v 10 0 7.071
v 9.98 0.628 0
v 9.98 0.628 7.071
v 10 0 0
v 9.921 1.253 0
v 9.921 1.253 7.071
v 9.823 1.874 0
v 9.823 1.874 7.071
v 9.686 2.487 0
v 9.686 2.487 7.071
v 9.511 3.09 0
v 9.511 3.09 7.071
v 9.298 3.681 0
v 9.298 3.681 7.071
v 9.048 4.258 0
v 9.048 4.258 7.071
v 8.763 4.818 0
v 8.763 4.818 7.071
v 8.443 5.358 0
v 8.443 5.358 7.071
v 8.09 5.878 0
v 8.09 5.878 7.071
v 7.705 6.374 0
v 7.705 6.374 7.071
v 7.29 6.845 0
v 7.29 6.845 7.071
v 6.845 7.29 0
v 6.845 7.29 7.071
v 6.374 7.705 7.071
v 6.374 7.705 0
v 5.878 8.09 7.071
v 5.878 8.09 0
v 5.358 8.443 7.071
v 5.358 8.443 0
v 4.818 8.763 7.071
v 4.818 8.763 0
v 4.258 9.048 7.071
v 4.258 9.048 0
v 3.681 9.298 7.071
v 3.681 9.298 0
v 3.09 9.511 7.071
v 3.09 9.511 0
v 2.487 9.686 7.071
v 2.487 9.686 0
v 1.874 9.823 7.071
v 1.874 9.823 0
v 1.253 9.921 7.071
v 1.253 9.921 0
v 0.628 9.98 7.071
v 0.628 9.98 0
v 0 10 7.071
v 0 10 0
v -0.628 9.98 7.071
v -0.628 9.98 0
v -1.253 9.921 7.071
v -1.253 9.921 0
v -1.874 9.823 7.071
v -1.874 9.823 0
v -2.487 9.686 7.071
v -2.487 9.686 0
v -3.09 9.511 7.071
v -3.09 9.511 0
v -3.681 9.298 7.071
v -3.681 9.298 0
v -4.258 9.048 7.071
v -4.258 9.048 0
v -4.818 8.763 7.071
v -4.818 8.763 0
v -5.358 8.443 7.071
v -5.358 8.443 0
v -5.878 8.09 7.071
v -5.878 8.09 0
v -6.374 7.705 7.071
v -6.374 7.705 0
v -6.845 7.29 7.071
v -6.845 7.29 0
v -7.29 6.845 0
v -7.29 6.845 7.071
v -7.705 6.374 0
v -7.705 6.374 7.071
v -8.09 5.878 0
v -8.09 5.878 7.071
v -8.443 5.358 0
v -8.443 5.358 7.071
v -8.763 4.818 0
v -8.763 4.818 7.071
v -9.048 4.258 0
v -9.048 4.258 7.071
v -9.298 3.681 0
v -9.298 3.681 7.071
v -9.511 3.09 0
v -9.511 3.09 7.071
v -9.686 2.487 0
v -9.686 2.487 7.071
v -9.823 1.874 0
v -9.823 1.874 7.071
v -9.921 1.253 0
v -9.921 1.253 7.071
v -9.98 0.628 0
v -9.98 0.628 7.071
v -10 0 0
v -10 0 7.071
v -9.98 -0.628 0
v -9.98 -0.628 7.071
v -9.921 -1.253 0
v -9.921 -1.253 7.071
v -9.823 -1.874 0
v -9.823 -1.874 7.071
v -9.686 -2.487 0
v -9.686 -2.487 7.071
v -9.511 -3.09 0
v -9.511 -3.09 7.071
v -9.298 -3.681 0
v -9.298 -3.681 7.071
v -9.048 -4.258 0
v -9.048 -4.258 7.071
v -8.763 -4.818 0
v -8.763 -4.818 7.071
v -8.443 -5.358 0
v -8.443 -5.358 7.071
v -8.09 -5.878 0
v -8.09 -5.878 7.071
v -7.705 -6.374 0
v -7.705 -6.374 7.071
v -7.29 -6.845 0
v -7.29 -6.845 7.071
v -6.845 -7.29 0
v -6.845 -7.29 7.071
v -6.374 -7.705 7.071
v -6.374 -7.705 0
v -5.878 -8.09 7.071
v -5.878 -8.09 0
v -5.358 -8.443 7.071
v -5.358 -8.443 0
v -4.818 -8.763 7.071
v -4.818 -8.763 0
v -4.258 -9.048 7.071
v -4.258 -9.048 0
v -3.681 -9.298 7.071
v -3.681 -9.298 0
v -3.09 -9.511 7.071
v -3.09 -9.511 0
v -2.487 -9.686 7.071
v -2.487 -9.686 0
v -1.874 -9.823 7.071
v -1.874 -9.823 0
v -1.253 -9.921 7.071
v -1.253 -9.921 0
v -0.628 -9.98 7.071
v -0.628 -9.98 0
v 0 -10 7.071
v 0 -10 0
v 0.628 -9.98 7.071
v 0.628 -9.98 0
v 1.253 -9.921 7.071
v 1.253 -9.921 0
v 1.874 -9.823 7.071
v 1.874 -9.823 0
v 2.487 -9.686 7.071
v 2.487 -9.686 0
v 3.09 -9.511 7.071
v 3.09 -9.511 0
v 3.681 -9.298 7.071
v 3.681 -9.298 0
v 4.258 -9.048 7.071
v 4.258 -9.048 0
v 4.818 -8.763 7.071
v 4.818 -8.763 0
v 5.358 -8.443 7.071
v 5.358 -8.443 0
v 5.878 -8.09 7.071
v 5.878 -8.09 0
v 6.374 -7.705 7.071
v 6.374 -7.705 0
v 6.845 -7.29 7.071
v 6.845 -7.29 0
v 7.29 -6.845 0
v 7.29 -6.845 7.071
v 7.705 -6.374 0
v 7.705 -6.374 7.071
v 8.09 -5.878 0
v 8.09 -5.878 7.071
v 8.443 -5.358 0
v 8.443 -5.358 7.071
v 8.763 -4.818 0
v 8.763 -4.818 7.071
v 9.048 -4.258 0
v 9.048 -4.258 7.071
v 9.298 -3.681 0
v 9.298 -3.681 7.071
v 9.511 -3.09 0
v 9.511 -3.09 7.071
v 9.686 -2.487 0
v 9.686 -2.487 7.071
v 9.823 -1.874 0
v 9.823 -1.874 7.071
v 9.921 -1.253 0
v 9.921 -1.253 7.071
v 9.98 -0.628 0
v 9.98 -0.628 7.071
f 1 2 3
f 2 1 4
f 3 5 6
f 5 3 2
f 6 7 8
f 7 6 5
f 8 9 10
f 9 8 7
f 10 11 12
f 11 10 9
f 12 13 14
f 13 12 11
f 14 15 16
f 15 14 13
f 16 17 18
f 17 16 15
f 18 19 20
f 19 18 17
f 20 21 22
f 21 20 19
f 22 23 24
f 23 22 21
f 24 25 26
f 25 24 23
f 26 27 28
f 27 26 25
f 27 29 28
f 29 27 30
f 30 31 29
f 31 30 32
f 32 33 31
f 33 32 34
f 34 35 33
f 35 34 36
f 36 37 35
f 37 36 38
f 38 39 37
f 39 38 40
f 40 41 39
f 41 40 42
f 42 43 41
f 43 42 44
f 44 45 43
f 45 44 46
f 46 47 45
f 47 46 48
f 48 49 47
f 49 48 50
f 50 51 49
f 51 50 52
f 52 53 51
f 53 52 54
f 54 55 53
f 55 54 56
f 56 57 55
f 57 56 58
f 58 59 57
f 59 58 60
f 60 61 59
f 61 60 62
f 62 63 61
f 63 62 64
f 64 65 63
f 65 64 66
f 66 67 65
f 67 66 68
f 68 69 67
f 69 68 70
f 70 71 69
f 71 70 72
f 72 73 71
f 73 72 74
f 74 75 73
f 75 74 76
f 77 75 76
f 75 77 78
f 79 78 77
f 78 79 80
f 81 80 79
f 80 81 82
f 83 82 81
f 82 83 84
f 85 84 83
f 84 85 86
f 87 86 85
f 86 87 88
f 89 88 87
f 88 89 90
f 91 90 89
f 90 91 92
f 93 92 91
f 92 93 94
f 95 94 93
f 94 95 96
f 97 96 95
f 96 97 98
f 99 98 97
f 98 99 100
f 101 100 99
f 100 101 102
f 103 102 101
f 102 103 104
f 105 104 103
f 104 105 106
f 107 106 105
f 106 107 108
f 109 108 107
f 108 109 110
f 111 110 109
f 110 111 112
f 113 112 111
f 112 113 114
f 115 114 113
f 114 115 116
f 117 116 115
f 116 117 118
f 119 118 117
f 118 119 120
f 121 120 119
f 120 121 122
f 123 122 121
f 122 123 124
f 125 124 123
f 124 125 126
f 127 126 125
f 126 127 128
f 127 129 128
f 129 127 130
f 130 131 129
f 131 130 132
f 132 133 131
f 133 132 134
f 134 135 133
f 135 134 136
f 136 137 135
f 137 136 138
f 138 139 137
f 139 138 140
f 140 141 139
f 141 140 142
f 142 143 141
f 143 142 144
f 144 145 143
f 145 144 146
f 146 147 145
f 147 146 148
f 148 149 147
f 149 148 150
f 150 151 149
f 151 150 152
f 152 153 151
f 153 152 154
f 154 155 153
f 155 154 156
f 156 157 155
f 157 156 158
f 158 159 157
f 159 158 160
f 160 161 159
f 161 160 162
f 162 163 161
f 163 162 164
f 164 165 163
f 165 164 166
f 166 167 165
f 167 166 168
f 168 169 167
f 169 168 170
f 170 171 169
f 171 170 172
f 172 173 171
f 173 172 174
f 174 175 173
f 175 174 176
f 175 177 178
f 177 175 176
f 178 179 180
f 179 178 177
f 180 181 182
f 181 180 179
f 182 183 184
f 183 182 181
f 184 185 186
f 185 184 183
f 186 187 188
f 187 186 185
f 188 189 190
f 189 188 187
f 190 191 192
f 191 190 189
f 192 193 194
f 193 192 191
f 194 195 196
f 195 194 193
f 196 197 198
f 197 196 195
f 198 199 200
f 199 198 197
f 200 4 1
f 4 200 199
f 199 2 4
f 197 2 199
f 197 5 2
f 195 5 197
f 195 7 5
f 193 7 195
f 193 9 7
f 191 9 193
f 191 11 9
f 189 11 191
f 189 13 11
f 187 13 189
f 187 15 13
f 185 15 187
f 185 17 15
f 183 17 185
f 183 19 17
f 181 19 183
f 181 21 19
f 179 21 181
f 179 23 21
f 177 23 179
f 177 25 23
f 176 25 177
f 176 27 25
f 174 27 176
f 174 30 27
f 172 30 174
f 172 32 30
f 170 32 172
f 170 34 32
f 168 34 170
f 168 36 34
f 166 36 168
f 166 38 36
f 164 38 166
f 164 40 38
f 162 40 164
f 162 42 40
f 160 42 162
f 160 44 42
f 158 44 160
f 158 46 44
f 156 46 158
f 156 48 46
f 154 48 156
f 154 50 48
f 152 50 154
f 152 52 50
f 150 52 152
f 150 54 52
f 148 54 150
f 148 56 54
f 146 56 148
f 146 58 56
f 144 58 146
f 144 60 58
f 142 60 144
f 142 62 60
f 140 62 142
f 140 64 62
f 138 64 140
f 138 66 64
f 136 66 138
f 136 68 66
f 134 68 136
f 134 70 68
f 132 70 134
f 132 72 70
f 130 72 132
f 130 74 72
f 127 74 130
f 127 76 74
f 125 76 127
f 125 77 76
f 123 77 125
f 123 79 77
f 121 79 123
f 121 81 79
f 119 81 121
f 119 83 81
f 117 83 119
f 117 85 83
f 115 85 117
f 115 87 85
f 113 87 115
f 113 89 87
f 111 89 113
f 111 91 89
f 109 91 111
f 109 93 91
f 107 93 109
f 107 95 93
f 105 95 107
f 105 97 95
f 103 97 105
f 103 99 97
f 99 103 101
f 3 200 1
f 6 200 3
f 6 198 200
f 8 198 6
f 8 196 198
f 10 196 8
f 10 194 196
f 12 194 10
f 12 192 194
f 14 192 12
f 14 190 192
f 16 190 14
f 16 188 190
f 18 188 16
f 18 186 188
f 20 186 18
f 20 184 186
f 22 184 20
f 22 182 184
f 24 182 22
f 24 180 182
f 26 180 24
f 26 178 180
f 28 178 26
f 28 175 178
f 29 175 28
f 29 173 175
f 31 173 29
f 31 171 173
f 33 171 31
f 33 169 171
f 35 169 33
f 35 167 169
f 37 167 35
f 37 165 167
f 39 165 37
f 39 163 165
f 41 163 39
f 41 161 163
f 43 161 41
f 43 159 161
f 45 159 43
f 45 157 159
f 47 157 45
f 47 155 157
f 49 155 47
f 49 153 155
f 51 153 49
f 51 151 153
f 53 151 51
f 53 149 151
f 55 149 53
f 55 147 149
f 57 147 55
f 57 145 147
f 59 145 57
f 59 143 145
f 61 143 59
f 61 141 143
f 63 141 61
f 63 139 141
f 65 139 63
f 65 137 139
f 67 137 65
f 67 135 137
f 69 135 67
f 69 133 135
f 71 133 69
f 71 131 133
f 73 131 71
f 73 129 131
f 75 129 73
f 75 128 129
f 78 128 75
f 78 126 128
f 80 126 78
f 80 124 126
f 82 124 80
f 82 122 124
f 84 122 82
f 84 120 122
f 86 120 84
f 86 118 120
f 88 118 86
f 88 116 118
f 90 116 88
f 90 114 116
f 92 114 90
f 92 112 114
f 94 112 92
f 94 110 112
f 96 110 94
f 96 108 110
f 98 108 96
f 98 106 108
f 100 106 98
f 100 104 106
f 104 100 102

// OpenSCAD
// mathgrrl cylinder coins
// for Matt Parker and Katie Steckles

/////////////////////////////////////////////////////////////////////////////
// PARAMETERS

// resolution 
$fn = 100*1;

// diameter of the coin
d = 20;
r = d/2;

// select from popular thickness-to-diameter ratios
ratio = 2.82843; // [2.82843:1 to 2*sqrt(2), 2.7182818:1 to e, 2.3333333:1 to 7/3, 2:1 to 2, 1.7320508:1 to sqrt(3), 0:Enter Custom Ratio Below]

// only use if "custom" selected above; enter 1 to ?? ratio
custom = 0;

// set rainal ratio to be custom if ratio=0, and ratio otherwise
final = (ratio == 0) ? custom : ratio;

// thickness based on ratio
thickness = d/final;

/////////////////////////////////////////////////////////////////////////////
// RENDERS

cylinder(thickness,r,r);
